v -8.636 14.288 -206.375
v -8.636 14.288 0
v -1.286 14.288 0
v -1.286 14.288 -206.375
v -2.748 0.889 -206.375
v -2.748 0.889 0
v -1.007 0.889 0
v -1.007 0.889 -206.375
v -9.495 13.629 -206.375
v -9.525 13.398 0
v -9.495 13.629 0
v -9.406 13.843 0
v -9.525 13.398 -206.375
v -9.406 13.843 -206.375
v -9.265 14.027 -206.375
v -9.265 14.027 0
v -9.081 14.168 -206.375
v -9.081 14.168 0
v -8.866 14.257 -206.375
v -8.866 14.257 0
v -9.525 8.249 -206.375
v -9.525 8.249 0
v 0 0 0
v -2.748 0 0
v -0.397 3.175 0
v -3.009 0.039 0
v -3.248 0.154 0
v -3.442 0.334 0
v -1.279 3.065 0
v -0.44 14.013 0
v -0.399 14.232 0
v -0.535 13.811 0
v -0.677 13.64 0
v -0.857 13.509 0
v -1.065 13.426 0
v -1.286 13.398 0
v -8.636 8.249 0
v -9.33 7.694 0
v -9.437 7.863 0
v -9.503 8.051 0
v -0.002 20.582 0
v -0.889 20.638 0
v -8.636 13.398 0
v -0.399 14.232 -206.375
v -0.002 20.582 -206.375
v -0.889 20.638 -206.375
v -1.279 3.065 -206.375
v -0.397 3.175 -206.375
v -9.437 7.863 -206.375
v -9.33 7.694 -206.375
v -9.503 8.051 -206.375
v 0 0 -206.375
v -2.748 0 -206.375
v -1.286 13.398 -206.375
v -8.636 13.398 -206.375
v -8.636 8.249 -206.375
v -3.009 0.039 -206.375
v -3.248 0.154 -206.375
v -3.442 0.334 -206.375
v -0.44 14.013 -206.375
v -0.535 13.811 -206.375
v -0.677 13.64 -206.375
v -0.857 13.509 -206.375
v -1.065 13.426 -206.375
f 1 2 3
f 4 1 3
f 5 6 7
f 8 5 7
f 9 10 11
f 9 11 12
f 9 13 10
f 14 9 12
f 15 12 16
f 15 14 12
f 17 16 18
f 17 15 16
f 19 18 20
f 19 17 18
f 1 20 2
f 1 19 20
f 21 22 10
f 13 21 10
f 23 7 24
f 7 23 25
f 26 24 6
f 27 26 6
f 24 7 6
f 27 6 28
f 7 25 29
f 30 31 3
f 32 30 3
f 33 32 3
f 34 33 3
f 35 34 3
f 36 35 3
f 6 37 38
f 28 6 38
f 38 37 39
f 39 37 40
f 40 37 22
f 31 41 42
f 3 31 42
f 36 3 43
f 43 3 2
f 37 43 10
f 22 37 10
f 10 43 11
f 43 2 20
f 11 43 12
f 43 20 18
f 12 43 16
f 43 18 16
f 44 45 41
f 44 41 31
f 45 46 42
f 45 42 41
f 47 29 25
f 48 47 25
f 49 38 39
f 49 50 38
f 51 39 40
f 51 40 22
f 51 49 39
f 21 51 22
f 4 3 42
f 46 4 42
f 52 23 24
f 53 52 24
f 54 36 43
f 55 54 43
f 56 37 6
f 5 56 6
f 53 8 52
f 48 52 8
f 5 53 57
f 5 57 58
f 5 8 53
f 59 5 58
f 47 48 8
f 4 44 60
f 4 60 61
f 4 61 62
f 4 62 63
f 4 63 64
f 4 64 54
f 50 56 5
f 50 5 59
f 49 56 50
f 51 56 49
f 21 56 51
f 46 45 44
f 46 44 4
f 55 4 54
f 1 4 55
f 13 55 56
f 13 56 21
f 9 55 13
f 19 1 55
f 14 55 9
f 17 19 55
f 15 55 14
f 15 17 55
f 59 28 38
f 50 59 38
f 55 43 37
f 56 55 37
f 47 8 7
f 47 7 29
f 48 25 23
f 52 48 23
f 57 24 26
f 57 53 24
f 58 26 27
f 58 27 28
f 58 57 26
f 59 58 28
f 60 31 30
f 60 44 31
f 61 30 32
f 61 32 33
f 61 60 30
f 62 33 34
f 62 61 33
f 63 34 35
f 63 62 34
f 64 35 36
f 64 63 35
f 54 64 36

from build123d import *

# Parameters (mm, degrees)
EXTRUDE_THIN1_DEPTH = 206.375
FILLET1_R           = 0.889


with BuildPart() as part:
    # Sketch1 → Extrude-Thin1 (new body)
    with BuildSketch(Plane.XY):
        Polygon((-0.396875, 3.175), (0, 0), (-3.175, 0), (-9.525, 7.9375), (-9.525, 14.2875), (-1.285875, 14.2875), (-0.889, 20.6375), (-0.001731258, 20.582045704), (-0.450702864, 13.3985), (-8.636, 13.3985), (-8.636, 8.249344362), (-2.747724511, 0.889), (-1.007043392, 0.889), (-1.279010032, 3.064733121), align=None)
    extrude(amount=-EXTRUDE_THIN1_DEPTH)

    # Fillet1
    fillet1_edges = [part.edges().sort_by_distance(p)[0] for p in [
        (-0.450702864, 13.3985, -103.1875),
        (-3.175, 0, -103.1875),
        (-9.525, 7.9375, -103.1875),
        (-9.525, 14.2875, -103.1875),
    ]]
    fillet(fillet1_edges, radius=FILLET1_R)


solid = part.part
